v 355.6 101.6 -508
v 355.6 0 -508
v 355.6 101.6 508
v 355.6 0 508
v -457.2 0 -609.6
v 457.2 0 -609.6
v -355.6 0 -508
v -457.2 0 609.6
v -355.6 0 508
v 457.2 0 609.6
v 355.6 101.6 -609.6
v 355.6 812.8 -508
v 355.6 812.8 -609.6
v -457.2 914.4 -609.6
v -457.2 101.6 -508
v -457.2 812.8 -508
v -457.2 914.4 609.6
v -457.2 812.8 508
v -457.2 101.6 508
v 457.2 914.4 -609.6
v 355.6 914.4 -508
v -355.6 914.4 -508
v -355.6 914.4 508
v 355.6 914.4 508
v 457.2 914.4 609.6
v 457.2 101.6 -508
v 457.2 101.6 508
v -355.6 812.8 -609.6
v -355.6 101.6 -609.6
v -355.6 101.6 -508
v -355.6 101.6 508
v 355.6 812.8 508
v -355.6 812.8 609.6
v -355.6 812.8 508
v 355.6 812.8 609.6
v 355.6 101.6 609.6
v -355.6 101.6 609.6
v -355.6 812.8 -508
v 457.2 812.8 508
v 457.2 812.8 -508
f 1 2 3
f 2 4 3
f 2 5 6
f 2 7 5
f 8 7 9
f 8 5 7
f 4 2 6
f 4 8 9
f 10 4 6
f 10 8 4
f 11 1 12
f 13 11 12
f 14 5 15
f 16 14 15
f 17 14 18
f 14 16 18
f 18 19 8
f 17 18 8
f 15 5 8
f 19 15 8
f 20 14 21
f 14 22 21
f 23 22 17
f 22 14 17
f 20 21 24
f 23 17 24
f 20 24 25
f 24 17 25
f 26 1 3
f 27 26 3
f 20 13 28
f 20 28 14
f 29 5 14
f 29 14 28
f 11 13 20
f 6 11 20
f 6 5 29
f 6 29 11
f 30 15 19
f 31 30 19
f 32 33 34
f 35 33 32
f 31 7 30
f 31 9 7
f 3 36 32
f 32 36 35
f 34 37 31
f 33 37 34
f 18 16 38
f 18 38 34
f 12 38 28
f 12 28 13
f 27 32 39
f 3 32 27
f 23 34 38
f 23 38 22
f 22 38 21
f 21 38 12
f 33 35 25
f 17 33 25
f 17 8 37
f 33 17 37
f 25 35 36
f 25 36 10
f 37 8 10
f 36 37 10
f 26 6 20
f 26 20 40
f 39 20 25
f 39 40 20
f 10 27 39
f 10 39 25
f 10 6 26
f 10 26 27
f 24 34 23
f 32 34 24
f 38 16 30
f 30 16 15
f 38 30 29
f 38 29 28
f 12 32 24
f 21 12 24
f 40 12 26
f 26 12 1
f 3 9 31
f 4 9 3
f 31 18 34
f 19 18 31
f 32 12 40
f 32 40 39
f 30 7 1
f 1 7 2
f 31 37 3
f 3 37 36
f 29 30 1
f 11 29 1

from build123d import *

# Parameters (mm, degrees)
F0_W     = 914.4
F0_H     = 1219.2
F0_W_2   = 711.2
F0_H_2   = 1016
F1_DEPTH = 914.4
F2_W     = 711.2
F2_H     = 711.2
F3_DEPTH = 1219.2
F4_W     = 711.2
F4_H     = 1016
F5_DEPTH = 914.4


with BuildPart() as f1:
    # F0 (on Front) → F1 (new body)
    with BuildSketch(Plane.XZ):
        Rectangle(F0_W, F0_H)
        Rectangle(F0_W_2, F0_H_2, mode=Mode.SUBTRACT)
    extrude(amount=-F1_DEPTH)

    # F2 (on face) → F3 (cut)
    with BuildSketch(Plane.XY.offset(609.6)):
        with Locations((0, 457.2)):
            Rectangle(F2_W, F2_H)
    extrude(amount=-F3_DEPTH, mode=Mode.SUBTRACT)

    # F4 (on face) → F5 (cut)
    with BuildSketch(Plane(origin=(-457.2, 0, 0), x_dir=(0, -1, 0), z_dir=(-1, 0, 0))):
        with Locations((-457.2, 0)):
            Rectangle(F4_W, F4_H)
    extrude(amount=-F5_DEPTH, mode=Mode.SUBTRACT)


solid = f1.part
